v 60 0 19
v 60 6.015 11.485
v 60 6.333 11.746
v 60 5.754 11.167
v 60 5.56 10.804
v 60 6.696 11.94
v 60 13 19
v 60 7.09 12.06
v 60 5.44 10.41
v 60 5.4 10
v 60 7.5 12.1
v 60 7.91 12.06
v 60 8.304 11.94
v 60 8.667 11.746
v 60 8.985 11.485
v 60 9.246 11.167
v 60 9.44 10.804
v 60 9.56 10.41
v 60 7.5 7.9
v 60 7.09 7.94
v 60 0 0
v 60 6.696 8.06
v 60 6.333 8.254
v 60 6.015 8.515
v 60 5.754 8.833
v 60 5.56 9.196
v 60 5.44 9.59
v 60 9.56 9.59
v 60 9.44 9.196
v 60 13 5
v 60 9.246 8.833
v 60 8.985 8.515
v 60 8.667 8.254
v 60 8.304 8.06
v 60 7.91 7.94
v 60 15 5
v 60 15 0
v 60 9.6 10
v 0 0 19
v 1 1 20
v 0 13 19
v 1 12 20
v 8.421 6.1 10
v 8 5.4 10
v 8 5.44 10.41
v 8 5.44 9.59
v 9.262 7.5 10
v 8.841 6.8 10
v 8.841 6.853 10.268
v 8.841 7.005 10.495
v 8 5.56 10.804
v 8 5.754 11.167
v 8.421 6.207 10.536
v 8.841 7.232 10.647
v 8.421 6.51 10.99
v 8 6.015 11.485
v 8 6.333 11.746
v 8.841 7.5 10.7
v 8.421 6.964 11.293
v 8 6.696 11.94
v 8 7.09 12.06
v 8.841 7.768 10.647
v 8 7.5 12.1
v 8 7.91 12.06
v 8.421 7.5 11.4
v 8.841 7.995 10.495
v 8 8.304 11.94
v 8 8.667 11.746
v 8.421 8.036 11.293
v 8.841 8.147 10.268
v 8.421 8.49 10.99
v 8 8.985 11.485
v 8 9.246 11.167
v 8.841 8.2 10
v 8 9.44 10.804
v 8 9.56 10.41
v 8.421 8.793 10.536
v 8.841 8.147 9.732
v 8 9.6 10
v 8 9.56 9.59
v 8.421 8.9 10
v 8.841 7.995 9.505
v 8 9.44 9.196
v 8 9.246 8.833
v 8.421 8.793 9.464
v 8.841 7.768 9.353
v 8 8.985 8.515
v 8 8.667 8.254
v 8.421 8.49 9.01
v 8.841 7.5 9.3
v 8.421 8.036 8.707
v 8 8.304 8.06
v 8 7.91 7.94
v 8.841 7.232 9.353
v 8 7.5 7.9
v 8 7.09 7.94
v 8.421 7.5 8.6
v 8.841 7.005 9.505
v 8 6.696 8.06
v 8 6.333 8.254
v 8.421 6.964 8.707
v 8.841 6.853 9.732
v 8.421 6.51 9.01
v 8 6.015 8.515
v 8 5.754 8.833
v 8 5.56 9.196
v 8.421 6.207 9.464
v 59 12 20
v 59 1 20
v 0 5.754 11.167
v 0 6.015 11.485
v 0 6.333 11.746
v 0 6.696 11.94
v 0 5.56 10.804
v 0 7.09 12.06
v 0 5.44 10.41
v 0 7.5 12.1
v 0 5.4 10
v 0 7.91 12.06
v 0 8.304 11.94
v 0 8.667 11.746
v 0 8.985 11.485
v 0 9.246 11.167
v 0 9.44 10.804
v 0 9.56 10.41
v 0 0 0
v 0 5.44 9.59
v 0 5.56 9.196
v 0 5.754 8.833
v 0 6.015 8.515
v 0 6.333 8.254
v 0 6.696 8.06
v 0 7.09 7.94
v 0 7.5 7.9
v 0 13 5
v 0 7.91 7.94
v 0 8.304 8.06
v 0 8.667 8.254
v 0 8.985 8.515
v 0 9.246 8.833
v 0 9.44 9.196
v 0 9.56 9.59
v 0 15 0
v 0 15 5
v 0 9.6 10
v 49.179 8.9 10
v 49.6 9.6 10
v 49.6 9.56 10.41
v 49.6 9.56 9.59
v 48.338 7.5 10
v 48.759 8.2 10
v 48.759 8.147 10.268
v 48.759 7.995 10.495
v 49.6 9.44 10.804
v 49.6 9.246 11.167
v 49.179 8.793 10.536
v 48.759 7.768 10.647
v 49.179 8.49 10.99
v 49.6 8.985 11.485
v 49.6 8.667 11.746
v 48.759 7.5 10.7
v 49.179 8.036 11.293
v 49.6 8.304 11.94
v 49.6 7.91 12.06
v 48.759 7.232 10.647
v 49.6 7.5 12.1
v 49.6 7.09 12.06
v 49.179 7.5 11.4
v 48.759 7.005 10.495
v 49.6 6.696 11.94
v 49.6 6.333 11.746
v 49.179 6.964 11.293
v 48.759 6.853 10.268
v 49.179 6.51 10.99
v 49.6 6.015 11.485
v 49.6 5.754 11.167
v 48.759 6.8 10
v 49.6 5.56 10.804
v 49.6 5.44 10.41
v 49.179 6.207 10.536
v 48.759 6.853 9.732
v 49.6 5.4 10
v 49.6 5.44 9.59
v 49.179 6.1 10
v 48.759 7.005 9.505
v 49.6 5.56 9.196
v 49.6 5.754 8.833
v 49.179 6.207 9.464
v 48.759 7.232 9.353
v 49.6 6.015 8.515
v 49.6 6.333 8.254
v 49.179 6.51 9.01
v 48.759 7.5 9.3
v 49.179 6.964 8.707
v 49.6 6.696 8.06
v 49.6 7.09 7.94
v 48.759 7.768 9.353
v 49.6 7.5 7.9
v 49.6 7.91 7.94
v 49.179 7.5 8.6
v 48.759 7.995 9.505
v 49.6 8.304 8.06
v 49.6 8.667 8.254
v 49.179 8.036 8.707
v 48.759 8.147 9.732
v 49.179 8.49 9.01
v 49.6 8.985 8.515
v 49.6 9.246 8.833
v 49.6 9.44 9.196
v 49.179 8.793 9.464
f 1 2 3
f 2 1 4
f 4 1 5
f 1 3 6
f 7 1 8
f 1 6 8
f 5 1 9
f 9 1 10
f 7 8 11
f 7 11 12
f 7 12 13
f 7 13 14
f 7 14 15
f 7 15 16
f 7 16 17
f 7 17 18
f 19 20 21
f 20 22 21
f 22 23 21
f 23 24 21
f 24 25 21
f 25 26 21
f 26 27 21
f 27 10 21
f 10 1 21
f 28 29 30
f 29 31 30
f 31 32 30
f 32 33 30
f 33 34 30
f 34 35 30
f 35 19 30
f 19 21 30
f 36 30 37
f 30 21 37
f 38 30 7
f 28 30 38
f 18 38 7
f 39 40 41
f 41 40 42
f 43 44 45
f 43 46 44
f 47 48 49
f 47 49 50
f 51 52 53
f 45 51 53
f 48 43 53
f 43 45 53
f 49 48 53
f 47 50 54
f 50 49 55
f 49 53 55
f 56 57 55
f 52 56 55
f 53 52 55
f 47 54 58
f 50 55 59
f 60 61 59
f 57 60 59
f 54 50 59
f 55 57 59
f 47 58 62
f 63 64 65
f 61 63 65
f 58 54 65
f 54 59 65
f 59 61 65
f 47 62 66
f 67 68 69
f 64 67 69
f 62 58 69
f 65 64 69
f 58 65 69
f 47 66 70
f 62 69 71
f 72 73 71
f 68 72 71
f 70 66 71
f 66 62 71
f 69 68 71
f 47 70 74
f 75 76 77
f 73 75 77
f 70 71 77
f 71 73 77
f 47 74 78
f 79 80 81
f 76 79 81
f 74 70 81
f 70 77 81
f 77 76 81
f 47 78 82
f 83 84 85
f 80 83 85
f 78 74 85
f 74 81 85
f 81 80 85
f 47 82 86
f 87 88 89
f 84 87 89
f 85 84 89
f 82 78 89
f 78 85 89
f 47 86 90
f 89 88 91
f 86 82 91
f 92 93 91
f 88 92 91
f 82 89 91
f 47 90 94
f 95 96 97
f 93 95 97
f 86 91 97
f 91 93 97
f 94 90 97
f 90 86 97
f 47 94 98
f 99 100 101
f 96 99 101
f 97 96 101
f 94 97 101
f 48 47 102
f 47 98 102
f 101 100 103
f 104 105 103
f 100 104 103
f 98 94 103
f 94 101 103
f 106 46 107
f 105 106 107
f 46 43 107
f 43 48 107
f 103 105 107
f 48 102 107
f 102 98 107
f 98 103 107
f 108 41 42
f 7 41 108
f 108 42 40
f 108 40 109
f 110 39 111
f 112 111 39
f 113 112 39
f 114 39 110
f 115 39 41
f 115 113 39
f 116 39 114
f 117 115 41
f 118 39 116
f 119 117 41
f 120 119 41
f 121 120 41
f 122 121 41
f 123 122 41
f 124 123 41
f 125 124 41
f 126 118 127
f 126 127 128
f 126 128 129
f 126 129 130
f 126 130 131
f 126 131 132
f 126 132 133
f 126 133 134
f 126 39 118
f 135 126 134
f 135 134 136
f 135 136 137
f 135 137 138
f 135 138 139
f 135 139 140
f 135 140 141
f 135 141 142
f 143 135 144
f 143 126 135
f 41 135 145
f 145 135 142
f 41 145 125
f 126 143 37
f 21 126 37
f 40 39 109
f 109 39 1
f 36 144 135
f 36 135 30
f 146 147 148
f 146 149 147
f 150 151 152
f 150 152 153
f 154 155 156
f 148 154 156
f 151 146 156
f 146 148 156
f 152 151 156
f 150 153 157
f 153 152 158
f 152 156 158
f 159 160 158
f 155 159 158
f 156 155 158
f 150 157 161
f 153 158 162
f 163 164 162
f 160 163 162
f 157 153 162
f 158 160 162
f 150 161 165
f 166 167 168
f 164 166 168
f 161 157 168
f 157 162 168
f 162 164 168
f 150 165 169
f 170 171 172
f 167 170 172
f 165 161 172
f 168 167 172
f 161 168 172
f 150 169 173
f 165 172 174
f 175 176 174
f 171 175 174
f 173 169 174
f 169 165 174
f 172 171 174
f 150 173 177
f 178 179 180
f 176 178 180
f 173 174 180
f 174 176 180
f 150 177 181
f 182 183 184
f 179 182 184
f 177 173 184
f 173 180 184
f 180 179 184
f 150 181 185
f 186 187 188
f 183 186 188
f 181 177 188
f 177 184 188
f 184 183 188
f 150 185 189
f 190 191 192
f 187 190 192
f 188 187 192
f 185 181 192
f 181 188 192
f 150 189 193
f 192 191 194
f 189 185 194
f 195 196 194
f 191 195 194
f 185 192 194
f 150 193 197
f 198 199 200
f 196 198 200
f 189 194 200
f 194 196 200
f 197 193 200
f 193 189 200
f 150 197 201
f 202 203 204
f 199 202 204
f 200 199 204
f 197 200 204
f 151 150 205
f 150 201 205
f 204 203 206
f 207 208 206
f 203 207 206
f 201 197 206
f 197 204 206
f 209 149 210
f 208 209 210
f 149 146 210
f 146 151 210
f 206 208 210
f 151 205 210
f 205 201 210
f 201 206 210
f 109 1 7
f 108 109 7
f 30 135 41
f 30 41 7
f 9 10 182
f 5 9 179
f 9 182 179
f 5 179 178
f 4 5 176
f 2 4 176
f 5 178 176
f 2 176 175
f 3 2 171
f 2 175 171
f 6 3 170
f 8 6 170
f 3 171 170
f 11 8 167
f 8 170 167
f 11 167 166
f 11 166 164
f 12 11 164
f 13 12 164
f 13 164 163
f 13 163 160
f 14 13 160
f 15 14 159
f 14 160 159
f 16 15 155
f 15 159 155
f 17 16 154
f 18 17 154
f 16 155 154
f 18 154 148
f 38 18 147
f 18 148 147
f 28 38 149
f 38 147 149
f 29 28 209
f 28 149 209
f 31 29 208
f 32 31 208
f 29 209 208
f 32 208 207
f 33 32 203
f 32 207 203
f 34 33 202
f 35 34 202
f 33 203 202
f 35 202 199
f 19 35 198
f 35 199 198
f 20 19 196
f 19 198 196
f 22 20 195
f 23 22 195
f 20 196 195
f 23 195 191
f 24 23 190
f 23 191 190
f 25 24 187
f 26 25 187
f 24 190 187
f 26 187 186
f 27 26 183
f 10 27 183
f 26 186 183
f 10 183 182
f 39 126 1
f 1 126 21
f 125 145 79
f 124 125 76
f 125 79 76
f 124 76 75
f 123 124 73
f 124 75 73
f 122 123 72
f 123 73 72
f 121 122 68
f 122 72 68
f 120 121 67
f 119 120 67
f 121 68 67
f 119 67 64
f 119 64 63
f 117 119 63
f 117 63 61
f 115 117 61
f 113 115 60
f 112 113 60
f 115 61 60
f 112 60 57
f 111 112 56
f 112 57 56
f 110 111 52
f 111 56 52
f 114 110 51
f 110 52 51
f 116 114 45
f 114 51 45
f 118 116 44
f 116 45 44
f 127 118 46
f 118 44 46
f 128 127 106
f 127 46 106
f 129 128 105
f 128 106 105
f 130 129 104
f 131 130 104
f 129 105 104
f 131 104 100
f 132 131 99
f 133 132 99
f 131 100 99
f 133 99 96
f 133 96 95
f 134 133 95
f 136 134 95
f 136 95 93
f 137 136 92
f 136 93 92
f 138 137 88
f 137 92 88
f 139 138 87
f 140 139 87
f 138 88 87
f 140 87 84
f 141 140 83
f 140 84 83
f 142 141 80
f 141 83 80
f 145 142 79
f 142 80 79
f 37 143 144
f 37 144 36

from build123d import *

# Parameters (mm, degrees)
F0_W     = 60
F0_H     = 15
F1_DEPTH = 5
F2_W     = 60
F2_H     = 13
F3_DEPTH = 15
F5_D     = 4.2
F5_DEPTH = 10.4
F5_TIP   = 1.2618073
F7_D     = 4.2
F7_DEPTH = 8
F7_TIP   = 1.2618073
F8_SIZE  = 1


with BuildPart() as f1:
    # F0 (on Top) → F1 (new body)
    with BuildSketch(Plane.XY):
        with Locations((30, 7.5)):
            Rectangle(F0_W, F0_H)
    extrude(amount=F1_DEPTH)

    # F2 (on face) → F3 (join)
    with BuildSketch(Plane.XY.offset(5)):
        with Locations((30, 6.5)):
            Rectangle(F2_W, F2_H)
    extrude(amount=F3_DEPTH)

    # F5
    with Locations(Plane.YZ.offset(60)):
        with Locations((7.5, 10)):
            Hole(F5_D / 2, depth=F5_DEPTH)
            with Locations((0, 0, -(F5_DEPTH + F5_TIP / 2))):  # 118° drill point
                Cone(0, F5_D / 2, F5_TIP, mode=Mode.SUBTRACT)

    # F7
    with Locations(Plane(origin=(0, 0, 0), x_dir=(0, -1, 0), z_dir=(-1, 0, 0))):
        with Locations((-7.5, 10)):
            Hole(F7_D / 2, depth=F7_DEPTH)
            with Locations((0, 0, -(F7_DEPTH + F7_TIP / 2))):  # 118° drill point
                Cone(0, F7_D / 2, F7_TIP, mode=Mode.SUBTRACT)

    # F8
    f8_edges = [f1.edges().sort_by_distance(p)[0] for p in [
        (30, 13, 20),
        (30, 0, 20),
        (0, 6.5, 20),
        (60, 6.5, 20),
    ]]
    chamfer(f8_edges, length=F8_SIZE)


solid = f1.part
